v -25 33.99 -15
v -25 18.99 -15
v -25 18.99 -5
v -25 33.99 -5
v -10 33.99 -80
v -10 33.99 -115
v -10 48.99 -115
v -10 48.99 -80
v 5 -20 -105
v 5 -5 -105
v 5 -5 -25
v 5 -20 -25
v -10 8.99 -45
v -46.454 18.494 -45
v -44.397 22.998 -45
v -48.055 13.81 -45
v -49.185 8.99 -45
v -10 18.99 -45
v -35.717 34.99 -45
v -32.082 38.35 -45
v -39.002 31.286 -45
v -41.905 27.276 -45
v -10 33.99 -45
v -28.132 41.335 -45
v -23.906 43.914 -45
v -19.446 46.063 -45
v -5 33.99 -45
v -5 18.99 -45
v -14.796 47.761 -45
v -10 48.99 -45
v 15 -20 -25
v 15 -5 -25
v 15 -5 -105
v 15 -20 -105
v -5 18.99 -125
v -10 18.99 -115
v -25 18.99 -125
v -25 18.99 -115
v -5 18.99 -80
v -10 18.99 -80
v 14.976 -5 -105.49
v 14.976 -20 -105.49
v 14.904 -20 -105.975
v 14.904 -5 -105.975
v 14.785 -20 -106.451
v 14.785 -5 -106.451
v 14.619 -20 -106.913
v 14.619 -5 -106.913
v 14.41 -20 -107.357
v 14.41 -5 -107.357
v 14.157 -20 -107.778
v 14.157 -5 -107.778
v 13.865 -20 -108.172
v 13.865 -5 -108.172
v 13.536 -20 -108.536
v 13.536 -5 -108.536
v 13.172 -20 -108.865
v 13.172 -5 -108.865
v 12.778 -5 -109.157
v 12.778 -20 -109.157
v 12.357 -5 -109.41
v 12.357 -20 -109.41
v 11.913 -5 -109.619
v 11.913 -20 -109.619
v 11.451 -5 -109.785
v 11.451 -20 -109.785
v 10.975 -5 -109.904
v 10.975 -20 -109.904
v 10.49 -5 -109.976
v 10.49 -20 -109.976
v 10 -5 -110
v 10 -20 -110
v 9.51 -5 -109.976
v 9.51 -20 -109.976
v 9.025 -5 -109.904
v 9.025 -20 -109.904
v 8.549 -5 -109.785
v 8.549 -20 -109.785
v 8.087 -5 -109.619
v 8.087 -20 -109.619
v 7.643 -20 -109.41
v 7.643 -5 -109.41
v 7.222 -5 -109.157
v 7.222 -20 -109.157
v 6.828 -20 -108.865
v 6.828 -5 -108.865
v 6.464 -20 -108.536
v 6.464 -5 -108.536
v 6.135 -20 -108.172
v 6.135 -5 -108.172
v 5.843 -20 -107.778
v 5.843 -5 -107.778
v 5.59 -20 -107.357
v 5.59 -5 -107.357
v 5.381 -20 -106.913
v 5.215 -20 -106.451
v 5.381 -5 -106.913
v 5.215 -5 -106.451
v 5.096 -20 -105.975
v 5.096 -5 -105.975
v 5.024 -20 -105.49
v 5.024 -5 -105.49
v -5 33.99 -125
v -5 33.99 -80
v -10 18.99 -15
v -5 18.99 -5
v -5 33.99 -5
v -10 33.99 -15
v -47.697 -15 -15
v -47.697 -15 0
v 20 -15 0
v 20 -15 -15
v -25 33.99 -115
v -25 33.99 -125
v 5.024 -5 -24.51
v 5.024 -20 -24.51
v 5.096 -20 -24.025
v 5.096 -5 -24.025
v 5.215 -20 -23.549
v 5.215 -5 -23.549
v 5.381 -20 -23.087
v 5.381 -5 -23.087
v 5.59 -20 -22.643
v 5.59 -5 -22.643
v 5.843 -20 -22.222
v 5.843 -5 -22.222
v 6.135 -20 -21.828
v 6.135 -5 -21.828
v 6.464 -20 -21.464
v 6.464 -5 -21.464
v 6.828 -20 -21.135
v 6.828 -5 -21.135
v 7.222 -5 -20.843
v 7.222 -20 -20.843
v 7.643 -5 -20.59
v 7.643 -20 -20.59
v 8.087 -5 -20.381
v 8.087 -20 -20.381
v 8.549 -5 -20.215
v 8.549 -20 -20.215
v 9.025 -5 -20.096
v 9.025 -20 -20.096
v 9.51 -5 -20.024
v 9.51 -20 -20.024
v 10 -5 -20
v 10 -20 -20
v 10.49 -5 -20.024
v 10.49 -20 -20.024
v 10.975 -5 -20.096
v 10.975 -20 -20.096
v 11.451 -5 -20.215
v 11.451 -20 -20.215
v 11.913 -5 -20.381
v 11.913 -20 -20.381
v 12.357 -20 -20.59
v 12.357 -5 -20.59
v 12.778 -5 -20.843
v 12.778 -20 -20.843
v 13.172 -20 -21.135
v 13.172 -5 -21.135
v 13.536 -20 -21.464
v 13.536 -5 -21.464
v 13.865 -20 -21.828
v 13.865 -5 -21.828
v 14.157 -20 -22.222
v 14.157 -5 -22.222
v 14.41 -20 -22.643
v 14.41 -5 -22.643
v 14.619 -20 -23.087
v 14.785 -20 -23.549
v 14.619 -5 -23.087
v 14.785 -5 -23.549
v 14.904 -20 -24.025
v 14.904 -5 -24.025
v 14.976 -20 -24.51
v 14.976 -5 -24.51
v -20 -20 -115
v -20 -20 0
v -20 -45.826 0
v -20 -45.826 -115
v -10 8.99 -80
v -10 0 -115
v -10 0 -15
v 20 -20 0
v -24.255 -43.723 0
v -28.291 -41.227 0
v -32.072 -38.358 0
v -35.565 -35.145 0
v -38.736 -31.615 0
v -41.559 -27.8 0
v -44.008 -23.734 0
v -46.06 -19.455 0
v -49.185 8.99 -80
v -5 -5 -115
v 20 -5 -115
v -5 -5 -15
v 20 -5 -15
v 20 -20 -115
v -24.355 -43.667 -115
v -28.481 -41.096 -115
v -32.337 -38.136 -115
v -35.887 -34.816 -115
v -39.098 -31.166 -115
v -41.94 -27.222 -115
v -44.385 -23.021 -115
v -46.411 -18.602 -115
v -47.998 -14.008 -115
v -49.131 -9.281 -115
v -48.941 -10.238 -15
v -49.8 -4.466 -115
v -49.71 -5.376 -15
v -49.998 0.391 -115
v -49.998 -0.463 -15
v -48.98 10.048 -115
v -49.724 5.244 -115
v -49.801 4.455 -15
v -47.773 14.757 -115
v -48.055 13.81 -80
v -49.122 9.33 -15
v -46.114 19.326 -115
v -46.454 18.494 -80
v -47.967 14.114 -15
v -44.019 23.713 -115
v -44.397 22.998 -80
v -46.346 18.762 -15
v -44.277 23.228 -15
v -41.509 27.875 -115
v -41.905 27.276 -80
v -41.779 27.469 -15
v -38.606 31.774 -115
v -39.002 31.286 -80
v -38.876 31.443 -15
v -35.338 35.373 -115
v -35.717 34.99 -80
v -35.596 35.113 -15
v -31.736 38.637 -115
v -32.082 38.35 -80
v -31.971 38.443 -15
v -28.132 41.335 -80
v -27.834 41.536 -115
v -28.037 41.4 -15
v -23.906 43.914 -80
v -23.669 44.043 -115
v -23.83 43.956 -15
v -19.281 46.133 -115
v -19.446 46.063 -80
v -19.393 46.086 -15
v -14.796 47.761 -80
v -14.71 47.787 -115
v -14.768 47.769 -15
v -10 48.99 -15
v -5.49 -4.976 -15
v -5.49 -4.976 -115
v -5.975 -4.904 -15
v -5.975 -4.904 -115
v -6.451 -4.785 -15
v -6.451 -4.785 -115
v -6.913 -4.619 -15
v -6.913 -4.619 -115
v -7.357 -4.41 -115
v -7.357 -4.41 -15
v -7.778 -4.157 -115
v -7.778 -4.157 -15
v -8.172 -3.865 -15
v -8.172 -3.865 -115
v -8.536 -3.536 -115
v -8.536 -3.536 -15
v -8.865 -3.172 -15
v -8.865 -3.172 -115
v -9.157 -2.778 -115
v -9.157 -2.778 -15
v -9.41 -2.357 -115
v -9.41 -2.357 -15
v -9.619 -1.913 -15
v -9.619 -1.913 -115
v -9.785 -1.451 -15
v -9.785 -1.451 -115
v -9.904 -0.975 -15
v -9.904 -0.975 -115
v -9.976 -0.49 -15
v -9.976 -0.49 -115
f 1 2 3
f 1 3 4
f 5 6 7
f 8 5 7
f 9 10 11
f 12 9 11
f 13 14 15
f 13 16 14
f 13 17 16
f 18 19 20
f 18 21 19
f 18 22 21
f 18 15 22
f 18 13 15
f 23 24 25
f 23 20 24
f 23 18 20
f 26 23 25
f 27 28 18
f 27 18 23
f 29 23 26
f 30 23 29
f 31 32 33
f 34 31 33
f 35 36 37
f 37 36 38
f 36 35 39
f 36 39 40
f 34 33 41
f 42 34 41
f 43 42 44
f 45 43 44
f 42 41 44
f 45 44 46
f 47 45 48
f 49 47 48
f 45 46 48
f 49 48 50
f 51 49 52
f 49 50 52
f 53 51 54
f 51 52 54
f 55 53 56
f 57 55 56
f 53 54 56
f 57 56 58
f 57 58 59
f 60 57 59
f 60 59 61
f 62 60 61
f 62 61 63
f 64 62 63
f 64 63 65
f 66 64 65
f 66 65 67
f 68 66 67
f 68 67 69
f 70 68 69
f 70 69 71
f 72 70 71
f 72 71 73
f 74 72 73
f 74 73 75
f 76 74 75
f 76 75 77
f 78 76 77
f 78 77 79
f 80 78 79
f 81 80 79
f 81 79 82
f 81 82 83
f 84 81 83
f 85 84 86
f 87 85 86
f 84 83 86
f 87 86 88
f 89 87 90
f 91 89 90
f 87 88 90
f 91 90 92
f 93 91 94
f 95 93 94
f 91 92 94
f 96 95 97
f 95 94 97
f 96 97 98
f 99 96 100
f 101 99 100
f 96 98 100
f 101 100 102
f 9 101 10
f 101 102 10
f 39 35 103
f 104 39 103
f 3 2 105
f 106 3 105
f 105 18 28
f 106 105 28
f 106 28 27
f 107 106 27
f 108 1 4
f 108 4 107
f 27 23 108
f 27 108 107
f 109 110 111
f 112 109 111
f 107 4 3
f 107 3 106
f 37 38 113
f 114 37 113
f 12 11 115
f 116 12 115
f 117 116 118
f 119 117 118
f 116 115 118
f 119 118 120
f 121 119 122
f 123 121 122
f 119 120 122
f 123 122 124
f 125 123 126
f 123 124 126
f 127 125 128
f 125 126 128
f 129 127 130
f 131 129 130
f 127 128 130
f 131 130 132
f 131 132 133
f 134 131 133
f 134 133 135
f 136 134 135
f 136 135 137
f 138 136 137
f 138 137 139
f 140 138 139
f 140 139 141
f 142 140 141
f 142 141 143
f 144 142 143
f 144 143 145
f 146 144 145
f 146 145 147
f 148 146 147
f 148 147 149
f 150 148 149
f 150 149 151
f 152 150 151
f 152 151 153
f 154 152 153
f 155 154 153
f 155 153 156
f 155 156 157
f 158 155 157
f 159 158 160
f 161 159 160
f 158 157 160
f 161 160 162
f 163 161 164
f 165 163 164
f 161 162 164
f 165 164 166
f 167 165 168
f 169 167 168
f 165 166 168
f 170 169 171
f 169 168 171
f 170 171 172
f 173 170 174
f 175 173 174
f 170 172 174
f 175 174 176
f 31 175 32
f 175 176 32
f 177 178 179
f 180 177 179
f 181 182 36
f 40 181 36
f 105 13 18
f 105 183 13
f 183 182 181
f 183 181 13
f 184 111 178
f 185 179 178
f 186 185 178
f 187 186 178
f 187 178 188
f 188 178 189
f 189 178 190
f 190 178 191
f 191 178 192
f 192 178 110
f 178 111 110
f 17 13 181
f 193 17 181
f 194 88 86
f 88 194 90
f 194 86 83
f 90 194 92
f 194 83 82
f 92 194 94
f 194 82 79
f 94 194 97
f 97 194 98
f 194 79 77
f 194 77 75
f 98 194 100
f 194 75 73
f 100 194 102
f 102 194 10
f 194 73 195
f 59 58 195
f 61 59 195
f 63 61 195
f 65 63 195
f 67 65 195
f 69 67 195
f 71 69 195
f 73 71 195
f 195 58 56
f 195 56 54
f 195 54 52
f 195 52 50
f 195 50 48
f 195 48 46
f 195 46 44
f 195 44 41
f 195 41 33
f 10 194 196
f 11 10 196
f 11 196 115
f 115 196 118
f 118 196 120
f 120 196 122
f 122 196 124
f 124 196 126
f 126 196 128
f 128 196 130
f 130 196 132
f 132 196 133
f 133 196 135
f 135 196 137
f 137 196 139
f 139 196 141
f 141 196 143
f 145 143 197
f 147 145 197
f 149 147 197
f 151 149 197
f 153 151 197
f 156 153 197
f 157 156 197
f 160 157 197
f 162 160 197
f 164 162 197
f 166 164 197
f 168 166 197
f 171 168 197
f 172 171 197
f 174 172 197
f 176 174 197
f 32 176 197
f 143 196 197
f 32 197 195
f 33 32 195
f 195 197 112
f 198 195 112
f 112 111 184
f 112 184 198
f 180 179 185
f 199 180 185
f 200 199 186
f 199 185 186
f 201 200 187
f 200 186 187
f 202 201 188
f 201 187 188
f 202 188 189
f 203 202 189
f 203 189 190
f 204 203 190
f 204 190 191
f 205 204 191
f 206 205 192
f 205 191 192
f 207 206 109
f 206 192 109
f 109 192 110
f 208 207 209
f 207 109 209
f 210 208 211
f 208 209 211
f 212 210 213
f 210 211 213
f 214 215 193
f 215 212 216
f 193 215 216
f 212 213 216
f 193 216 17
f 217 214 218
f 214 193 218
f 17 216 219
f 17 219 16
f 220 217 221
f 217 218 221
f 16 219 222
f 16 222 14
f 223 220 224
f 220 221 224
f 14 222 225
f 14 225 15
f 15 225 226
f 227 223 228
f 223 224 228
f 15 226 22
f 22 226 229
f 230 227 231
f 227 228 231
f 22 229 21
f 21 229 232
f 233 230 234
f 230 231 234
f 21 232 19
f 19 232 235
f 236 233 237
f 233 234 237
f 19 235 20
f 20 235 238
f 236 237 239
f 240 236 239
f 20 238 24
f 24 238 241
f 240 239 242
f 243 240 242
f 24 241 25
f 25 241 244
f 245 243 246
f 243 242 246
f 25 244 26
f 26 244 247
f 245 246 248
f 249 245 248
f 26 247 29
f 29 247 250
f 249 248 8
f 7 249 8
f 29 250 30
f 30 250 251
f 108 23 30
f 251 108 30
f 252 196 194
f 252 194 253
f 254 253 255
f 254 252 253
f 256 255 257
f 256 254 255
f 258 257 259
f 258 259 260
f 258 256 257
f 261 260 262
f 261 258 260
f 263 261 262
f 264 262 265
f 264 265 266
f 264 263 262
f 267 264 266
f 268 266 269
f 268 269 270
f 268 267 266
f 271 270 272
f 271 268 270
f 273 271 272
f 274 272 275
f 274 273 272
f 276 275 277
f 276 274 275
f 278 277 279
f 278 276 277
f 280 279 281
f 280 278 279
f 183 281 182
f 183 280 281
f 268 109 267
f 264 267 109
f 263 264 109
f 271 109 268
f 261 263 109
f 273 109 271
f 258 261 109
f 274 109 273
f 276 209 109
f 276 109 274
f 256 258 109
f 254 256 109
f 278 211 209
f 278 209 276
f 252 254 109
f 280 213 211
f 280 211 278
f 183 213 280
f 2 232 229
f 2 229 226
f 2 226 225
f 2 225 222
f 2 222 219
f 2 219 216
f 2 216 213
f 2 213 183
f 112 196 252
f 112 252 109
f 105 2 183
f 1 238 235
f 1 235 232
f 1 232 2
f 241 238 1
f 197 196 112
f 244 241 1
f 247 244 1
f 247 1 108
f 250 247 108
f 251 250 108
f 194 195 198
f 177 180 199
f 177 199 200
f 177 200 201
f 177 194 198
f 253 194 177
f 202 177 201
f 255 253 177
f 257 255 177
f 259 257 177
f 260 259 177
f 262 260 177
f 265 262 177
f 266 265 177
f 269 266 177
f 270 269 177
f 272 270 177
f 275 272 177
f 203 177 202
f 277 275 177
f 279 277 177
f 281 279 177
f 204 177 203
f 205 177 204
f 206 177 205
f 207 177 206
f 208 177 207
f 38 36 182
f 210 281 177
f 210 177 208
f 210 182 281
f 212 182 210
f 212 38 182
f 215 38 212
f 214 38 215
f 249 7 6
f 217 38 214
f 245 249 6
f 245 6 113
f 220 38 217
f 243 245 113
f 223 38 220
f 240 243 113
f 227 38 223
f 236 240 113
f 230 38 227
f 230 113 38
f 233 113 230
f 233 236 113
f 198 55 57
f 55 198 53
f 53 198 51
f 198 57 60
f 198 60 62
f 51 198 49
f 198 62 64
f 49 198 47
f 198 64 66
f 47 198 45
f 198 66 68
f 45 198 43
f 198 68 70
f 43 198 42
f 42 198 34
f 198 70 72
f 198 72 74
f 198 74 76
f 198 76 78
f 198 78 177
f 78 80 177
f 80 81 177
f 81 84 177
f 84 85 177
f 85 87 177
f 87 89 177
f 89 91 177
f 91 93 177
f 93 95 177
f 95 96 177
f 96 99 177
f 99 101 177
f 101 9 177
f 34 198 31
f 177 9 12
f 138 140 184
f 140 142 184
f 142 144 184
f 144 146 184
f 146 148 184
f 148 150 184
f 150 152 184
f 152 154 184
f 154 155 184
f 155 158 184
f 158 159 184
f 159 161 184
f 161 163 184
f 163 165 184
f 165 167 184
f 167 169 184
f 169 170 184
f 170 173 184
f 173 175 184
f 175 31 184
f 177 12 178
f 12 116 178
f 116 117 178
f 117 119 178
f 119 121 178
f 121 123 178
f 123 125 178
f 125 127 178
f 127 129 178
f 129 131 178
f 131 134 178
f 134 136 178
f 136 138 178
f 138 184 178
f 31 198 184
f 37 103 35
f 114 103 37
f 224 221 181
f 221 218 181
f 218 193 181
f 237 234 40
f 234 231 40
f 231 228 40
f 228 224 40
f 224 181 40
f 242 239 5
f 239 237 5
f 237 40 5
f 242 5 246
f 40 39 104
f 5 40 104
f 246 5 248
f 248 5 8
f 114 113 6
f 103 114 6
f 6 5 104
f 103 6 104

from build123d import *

# Parameters (mm, degrees)
BOSS_EXTRUDE1_DEPTH      = 115
CUT_EXTRUDE4_DEPTH       = 115
CUT_EXTRUDE5_DEPTH       = 115
CUT_EXTRUDE7_DEPTH       = 15
SKETCH8_W                = 35
SKETCH8_H                = 40
CUT_EXTRUDE8_DEPTH       = 55
BOSS_EXTRUDE2_DEPTH      = 10
BOSS_EXTRUDE2_DEPTH_BACK = 30
SKETCH9_W                = 20
SKETCH9_H                = 15
BOSS_EXTRUDE4_DEPTH      = 10
BOSS_EXTRUDE4_DEPTH_BACK = 35
SKETCH10_W               = 15
SKETCH10_H               = 15
SKETCH10_W_2             = 5
CUT_EXTRUDE9_DEPTH       = 35


with BuildPart() as part:
    # Sketch1 → Boss-Extrude1 (new body)
    with BuildSketch(Plane.XY):
        with BuildLine():
            Line((0, 50), (0, -5))
            Line((0, -5), (20, -5))
            Line((20, -5), (20, -20))
            Line((20, -20), (0, -20))
            Line((0, -20), (0, -50))
            ThreePointArc((0, -50), (-50, 0), (0, 50))
        make_face()
    extrude(amount=-BOSS_EXTRUDE1_DEPTH)

    # Sketch2 → Cut-Extrude4 (cut)
    with BuildSketch(Plane.XY):
        with BuildLine():
            Line((0, -5), (-5, -5))
            ThreePointArc((-5, -5), (-8.535533906, -3.535533906), (-10, 0))
            Line((-10, 0), (-10, 48.989794856))
            ThreePointArc((-10, 48.989794856), (-5.0254481, 49.74680765), (0, 50))
            Line((0, 50), (0, -5))
        make_face()
    extrude(amount=-CUT_EXTRUDE4_DEPTH, mode=Mode.SUBTRACT)

    # Sketch6 → Cut-Extrude5 (cut)
    with BuildSketch(Plane.XY):
        with BuildLine():
            Line((0, -20), (-20, -20))
            Line((-20, -20), (-20, -45.82575695))
            ThreePointArc((-20, -45.82575695), (-10.215482184, -48.945315647), (0, -50))
            Line((0, -50), (0, -20))
        make_face()
    extrude(amount=-CUT_EXTRUDE5_DEPTH, mode=Mode.SUBTRACT)

    # Sketch7 → Cut-Extrude7 (cut)
    with BuildSketch(Plane.XY):
        with BuildLine():
            Line((20, -5), (-5, -5))
            ThreePointArc((-5, -5), (-8.535533906, -3.535533906), (-10, 0))
            Line((-10, 0), (-10, 48.989794856))
            ThreePointArc((-10, 48.989794856), (-43.080253734, 25.378962513), (-47.696960071, -15))
            Line((-47.696960071, -15), (20, -15))
            Line((20, -15), (20, -5))
        make_face()
    extrude(amount=-CUT_EXTRUDE7_DEPTH, mode=Mode.SUBTRACT)

    # Sketch8 → Cut-Extrude8 (cut)
    with BuildSketch(Plane(origin=(-10, 0, 0), x_dir=(0, 0, -1), z_dir=(1, 0, 0))):
        with Locations((62.5, 28.989794856)):
            Rectangle(SKETCH8_W, SKETCH8_H)
    extrude(amount=-CUT_EXTRUDE8_DEPTH, mode=Mode.SUBTRACT)

    # Sketch9 → Boss-Extrude2 (add, two sides: drawn at the far end of the back side and taken through both)
    with BuildSketch(Plane.XY.offset(-15).offset(-BOSS_EXTRUDE2_DEPTH_BACK)):
        with Locations((-15, 26.489794856)):
            Rectangle(SKETCH9_W, SKETCH9_H)
    extrude(amount=BOSS_EXTRUDE2_DEPTH + BOSS_EXTRUDE2_DEPTH_BACK)

    # Sketch10 → Boss-Extrude4 (add, two sides: drawn at the far end of the back side and taken through both)
    with BuildSketch(Plane(origin=(0, 0, -115), x_dir=(-1, 0, 0), z_dir=(0, 0, -1)).offset(-BOSS_EXTRUDE4_DEPTH_BACK)):
        with Locations((17.5, 26.489794856)):
            Rectangle(SKETCH10_W, SKETCH10_H)
        with Locations((7.5, 26.489794856)):
            Rectangle(SKETCH10_W_2, SKETCH10_H)
    extrude(amount=BOSS_EXTRUDE4_DEPTH + BOSS_EXTRUDE4_DEPTH_BACK)

    # Sketch11 → Cut-Extrude9 (cut)
    with BuildSketch(Plane(origin=(0, -5, 0), x_dir=(1, 0, 0), z_dir=(0, 1, 0))):
        with BuildLine():
            Line((5, 105), (5, 25))
            ThreePointArc((5, 25), (10, 20), (15, 25))
            Line((15, 25), (15, 105))
            ThreePointArc((15, 105), (10, 110), (5, 105))
        make_face()
    extrude(amount=-CUT_EXTRUDE9_DEPTH, mode=Mode.SUBTRACT)


solid = part.part
